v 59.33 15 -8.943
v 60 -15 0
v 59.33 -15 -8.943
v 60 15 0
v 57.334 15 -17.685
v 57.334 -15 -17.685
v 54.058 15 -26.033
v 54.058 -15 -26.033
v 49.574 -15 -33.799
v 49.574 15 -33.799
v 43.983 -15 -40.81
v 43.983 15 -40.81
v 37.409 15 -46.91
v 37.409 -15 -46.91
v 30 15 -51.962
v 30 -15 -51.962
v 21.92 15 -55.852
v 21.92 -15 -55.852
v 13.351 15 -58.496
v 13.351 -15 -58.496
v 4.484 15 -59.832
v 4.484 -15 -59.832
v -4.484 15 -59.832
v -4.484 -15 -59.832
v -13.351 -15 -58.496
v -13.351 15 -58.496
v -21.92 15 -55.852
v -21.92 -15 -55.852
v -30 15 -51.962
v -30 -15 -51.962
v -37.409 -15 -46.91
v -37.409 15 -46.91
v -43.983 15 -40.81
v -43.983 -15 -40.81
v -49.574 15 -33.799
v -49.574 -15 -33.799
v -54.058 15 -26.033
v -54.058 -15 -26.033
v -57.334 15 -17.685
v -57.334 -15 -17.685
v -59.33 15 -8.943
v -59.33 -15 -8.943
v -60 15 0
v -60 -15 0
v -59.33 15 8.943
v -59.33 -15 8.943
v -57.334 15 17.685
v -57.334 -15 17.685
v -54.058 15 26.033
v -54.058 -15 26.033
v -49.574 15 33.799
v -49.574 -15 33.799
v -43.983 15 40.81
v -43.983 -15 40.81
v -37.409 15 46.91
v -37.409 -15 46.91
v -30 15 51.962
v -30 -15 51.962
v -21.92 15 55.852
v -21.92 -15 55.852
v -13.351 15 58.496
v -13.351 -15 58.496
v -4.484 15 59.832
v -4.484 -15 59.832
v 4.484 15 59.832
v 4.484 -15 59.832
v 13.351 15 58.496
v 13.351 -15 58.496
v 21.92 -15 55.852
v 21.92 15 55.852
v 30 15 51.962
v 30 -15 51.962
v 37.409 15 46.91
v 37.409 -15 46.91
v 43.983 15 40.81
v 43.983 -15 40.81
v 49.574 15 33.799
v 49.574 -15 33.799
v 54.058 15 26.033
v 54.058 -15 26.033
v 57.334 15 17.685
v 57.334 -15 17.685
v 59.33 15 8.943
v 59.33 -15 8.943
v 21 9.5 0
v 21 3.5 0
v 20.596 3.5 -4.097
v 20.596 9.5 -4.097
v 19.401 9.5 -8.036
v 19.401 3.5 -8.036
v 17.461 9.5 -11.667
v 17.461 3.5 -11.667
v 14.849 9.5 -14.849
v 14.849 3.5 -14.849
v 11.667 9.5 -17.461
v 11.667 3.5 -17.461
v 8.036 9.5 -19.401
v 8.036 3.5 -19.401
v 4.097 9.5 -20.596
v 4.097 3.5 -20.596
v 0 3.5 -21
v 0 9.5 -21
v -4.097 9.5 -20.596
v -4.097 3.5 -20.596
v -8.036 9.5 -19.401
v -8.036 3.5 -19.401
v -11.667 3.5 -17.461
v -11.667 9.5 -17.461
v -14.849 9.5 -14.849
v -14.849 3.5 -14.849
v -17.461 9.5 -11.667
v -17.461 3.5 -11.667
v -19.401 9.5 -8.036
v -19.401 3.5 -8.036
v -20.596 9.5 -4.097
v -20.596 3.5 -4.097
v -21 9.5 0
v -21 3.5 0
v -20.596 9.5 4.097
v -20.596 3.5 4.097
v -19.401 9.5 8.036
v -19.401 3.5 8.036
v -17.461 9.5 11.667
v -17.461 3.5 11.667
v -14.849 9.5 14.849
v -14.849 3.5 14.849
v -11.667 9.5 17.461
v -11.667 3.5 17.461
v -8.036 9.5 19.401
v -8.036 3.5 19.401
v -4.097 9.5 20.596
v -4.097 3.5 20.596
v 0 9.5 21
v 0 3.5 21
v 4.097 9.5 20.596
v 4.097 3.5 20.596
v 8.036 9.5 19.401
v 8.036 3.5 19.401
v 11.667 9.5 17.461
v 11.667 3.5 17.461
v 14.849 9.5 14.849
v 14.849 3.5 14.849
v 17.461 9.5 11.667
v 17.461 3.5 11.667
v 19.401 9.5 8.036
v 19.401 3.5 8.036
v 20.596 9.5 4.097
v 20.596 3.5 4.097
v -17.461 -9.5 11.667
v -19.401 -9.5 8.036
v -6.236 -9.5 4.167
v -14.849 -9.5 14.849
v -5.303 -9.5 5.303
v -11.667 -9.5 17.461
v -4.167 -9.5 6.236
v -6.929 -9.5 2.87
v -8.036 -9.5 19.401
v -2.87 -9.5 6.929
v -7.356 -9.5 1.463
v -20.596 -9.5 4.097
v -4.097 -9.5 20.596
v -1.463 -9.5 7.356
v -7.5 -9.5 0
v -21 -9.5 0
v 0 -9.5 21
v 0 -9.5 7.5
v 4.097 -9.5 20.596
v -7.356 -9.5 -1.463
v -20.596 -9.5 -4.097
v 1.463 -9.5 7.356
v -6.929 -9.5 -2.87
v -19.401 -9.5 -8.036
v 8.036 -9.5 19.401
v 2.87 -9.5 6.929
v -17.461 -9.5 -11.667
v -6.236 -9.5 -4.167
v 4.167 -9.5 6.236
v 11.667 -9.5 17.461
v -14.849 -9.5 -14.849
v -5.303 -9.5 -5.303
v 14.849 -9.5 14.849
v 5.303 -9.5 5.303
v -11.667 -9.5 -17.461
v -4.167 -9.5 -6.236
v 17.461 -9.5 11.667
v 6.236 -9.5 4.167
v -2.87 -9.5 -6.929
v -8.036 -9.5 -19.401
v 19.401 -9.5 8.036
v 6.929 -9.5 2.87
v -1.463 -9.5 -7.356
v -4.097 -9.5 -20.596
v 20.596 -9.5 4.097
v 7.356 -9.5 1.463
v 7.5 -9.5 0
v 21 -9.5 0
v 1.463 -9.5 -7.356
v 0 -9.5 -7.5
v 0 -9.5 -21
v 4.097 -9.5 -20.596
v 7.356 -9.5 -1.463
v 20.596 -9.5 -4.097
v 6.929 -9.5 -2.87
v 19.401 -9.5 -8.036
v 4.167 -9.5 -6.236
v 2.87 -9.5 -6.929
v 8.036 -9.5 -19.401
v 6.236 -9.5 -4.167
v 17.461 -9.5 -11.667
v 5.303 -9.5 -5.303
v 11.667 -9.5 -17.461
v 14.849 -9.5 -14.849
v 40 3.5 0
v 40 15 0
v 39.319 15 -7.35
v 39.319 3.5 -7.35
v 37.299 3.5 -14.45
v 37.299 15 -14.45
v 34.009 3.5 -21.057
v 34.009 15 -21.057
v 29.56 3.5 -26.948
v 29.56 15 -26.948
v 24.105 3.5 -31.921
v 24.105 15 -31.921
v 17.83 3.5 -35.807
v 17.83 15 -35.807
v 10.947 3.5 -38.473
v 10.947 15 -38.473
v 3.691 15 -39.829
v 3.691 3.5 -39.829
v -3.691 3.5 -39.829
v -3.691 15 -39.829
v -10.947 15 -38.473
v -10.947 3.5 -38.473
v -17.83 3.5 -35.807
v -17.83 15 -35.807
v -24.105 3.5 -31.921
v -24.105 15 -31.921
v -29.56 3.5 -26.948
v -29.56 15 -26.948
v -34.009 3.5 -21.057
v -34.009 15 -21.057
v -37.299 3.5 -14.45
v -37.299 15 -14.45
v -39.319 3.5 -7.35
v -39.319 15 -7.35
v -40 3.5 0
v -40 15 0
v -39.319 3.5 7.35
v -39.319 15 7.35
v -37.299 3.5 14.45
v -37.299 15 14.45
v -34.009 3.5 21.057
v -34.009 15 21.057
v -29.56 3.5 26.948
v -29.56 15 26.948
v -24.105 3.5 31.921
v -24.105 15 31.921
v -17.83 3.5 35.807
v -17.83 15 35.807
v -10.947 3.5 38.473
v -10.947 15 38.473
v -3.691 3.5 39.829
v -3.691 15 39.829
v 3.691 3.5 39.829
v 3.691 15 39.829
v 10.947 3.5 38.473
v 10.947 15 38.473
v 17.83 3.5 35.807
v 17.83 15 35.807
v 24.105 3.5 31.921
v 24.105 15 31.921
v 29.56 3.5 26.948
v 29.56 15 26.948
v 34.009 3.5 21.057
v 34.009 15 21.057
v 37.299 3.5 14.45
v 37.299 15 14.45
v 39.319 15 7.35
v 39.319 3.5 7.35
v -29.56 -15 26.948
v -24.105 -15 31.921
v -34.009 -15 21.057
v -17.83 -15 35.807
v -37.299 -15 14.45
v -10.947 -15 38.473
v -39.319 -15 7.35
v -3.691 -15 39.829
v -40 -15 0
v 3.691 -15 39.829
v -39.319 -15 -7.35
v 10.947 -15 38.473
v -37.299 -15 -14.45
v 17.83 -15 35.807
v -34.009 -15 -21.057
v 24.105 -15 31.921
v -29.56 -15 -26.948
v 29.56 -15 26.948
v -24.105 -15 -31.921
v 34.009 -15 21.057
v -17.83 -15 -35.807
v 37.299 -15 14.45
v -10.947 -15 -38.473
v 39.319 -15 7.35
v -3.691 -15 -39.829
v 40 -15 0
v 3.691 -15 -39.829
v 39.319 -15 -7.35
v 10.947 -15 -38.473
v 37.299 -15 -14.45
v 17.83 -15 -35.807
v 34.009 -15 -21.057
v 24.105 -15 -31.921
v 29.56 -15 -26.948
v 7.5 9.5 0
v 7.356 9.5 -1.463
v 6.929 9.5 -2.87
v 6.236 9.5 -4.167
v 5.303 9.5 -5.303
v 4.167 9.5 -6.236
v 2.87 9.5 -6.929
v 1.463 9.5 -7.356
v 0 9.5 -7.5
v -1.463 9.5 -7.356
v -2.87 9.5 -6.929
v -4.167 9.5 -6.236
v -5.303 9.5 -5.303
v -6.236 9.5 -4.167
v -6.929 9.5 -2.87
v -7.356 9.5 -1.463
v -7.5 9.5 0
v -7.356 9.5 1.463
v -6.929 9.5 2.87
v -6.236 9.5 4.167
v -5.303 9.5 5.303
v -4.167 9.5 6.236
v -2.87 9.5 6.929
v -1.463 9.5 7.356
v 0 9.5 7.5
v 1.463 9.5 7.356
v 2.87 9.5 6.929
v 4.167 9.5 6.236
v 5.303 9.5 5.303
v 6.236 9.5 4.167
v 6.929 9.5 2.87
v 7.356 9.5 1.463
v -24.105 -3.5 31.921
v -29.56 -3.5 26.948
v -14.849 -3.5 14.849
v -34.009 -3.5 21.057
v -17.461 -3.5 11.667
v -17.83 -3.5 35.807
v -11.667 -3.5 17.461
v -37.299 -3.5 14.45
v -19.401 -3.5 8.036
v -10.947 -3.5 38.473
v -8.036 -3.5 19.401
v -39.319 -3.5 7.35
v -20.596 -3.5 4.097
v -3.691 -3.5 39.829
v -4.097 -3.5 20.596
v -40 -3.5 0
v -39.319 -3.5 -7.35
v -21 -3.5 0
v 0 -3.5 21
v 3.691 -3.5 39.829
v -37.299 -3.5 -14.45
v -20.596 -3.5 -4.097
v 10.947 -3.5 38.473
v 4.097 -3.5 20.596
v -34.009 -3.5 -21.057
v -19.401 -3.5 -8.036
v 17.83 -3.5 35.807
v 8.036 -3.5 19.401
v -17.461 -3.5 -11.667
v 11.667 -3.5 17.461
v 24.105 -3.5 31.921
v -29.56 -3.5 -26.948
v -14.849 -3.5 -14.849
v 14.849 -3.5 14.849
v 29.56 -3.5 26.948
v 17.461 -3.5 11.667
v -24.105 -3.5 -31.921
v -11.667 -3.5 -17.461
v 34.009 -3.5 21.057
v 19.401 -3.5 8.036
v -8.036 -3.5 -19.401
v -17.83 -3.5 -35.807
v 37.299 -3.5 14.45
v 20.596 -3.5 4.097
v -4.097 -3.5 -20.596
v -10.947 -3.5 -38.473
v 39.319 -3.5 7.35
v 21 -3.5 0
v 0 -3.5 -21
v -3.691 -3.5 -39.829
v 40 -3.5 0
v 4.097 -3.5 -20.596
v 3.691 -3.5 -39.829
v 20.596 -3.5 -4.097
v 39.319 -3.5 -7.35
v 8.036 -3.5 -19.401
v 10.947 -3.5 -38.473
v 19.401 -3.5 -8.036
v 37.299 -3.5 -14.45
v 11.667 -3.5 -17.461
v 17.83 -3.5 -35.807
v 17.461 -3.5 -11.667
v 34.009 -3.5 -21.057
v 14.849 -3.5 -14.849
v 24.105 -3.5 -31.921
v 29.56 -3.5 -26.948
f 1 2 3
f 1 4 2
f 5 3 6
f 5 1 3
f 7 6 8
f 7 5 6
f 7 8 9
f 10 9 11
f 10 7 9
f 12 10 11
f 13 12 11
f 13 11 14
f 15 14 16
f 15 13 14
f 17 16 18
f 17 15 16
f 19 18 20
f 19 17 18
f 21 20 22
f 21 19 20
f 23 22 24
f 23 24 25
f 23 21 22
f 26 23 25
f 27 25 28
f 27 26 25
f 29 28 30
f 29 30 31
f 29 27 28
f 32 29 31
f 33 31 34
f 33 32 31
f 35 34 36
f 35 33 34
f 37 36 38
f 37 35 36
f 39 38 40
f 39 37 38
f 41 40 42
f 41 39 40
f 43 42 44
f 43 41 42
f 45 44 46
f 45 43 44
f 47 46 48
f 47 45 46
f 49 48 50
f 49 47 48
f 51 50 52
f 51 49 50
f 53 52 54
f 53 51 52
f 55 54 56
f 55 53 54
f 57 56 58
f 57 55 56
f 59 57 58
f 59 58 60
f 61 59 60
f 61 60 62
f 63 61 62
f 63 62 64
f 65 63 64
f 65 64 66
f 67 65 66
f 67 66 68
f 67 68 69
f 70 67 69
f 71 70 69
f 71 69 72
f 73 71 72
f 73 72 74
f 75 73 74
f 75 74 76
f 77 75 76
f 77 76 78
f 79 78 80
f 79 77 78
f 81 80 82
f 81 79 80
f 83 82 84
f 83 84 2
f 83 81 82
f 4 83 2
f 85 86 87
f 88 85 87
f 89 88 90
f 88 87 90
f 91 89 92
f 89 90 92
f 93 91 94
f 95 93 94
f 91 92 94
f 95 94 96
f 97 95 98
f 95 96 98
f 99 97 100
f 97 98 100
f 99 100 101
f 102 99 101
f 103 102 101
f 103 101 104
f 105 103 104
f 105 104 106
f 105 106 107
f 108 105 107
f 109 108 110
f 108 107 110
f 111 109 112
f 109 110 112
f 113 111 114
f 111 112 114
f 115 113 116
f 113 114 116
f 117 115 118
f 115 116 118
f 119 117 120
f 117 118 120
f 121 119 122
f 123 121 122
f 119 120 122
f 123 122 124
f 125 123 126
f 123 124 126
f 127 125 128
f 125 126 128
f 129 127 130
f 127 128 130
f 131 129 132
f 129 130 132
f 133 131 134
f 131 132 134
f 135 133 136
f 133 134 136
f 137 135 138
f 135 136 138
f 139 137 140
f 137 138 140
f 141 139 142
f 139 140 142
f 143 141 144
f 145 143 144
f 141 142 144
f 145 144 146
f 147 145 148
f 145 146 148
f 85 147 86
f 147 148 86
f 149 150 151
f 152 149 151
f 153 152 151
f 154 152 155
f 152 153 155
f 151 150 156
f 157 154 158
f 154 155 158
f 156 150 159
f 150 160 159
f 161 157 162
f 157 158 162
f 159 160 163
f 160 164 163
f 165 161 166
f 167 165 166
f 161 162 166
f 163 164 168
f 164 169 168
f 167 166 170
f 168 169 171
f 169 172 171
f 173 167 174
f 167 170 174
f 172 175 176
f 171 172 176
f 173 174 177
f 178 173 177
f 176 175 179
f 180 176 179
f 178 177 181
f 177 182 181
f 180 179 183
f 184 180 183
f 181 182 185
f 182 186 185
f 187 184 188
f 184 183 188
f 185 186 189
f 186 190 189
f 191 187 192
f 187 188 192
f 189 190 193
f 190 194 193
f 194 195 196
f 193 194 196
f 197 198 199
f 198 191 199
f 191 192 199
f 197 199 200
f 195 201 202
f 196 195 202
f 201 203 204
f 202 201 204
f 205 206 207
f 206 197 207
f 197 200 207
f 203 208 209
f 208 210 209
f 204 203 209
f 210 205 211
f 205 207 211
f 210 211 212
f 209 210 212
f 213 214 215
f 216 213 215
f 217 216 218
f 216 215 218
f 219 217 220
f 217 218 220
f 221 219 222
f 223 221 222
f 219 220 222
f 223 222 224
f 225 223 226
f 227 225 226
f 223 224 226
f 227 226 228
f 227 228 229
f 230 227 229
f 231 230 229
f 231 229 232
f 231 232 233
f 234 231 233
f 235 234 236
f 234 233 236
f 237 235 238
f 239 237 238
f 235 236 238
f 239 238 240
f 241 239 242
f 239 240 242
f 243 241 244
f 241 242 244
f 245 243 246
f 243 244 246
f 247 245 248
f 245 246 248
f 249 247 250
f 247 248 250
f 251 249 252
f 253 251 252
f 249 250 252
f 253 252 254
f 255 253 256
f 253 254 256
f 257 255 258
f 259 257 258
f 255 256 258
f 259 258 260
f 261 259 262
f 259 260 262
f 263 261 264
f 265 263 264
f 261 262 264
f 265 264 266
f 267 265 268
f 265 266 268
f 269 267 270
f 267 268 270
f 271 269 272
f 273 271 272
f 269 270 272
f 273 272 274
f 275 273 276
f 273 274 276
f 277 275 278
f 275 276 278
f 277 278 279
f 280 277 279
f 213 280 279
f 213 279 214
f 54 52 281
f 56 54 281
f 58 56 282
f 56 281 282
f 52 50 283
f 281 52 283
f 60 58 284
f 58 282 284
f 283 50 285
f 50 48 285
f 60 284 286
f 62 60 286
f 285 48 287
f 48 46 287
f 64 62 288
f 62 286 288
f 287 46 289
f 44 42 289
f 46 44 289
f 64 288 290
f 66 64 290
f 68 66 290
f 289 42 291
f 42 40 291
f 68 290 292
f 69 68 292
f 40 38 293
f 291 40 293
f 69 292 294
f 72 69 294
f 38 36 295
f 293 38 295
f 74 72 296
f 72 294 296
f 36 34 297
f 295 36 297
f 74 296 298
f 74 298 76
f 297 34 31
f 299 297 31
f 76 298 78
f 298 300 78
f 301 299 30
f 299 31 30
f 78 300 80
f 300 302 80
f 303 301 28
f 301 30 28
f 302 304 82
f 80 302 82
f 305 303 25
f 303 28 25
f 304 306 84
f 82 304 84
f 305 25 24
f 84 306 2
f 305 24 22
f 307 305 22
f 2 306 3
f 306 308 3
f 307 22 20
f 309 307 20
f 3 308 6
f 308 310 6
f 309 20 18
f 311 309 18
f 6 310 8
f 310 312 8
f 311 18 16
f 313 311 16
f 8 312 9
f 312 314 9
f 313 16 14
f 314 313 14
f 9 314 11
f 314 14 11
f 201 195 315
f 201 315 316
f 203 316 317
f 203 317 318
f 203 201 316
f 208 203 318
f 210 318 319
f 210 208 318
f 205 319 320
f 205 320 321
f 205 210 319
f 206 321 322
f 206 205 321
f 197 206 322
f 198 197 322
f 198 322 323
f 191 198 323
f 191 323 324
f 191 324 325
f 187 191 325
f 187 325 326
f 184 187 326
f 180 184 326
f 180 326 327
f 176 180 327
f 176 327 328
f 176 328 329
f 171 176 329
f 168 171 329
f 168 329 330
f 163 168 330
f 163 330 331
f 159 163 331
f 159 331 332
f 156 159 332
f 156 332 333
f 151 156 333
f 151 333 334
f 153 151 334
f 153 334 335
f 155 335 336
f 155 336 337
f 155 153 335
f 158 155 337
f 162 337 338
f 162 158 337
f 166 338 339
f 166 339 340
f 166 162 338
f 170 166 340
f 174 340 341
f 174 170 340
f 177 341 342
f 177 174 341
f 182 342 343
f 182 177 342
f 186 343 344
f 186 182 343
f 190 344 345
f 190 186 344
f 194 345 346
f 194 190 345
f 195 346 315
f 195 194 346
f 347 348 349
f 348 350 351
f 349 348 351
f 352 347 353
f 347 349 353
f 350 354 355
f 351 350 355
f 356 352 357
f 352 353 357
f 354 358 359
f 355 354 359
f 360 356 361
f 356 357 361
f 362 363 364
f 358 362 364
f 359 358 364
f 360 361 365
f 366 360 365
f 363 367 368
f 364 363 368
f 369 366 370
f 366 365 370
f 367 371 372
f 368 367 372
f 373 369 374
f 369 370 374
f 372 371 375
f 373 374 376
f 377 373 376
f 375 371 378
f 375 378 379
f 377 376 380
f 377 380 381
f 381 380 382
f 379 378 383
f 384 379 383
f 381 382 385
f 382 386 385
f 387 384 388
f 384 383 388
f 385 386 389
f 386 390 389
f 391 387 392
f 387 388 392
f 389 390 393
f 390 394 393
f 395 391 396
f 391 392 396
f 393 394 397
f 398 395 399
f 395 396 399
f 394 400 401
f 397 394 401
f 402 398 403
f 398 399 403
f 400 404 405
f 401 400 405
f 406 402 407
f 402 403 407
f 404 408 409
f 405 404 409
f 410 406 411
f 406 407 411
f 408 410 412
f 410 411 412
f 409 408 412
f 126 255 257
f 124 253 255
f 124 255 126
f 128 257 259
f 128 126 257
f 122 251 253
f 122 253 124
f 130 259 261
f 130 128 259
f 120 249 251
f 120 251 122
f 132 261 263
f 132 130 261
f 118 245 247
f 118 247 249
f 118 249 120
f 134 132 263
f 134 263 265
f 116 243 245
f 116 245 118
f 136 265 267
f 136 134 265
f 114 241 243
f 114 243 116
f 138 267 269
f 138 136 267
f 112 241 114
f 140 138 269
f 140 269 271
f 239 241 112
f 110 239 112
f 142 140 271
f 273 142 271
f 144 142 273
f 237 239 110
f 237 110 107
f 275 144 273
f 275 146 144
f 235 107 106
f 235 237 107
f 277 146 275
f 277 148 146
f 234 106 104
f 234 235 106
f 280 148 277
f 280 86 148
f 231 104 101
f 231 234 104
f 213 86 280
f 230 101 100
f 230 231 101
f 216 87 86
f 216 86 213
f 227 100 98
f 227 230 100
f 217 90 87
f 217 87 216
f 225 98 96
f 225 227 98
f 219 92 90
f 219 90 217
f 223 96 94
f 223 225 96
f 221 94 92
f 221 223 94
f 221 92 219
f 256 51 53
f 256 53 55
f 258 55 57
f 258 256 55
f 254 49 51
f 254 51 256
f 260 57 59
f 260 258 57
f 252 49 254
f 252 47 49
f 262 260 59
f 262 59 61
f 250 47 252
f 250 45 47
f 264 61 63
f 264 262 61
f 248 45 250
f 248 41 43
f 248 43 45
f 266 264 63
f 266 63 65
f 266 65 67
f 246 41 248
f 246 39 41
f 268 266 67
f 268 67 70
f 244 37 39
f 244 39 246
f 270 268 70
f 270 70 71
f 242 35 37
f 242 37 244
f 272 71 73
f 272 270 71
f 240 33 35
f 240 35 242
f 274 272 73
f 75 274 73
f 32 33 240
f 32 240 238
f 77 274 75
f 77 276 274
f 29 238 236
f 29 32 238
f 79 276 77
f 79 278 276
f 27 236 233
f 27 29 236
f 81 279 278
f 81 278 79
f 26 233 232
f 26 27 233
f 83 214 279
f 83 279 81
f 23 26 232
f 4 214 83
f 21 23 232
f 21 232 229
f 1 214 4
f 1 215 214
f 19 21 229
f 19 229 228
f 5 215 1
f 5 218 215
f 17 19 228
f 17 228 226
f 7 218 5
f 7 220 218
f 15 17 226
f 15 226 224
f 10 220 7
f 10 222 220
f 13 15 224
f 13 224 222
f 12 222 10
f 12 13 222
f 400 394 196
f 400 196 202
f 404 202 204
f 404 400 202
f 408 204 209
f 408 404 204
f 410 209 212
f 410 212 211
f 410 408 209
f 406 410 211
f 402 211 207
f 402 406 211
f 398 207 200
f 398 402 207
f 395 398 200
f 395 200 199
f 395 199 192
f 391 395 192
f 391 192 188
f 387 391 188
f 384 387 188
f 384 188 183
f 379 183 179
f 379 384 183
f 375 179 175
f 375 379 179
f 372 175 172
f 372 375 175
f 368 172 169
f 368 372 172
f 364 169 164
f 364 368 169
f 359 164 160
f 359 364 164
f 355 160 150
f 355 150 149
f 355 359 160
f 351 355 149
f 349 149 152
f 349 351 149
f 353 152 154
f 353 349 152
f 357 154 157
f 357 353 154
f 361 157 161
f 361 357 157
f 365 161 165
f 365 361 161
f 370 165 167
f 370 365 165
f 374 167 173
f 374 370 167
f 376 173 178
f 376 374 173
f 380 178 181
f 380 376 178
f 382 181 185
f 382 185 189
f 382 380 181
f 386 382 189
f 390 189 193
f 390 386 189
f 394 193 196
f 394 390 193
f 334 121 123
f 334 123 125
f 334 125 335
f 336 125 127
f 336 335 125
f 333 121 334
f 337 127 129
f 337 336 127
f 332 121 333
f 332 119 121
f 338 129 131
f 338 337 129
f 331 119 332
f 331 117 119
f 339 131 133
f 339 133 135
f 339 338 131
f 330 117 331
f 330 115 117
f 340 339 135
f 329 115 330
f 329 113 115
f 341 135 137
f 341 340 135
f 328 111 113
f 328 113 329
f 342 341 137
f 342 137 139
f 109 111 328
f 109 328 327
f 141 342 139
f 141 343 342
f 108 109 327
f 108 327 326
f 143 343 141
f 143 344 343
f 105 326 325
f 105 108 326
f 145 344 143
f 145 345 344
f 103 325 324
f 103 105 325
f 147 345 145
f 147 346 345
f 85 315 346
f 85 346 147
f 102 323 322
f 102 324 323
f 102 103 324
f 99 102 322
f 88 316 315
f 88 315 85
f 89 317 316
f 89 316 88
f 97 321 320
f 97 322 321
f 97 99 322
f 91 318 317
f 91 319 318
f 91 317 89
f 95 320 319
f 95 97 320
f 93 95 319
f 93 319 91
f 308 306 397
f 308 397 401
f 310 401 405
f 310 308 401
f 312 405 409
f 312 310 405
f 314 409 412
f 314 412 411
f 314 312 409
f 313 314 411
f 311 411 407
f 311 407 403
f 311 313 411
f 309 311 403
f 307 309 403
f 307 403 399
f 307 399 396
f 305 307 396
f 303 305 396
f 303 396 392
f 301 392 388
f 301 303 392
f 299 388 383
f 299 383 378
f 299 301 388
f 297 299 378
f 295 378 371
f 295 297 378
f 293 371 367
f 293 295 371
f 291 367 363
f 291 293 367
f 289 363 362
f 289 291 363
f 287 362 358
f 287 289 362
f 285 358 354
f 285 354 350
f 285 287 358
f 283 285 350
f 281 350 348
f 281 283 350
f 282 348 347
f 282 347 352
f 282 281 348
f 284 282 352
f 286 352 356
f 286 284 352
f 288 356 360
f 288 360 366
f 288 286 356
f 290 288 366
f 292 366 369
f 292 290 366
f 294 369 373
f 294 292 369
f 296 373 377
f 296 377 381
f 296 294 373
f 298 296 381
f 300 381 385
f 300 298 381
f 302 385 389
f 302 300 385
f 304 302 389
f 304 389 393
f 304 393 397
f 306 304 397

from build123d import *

# Parameters (mm, degrees)
BOSS_EXTRUDE1_DEPTH      = 15
BOSS_EXTRUDE1_DEPTH_BACK = 15
SKETCH2_R                = 60
SKETCH3_R                = 40
CUT_EXTRUDE1_DEPTH       = 11.5
SKETCH4_R                = 21
BOSS_EXTRUDE2_DEPTH      = 6
SKETCH5_R                = 7.5
CUT_EXTRUDE2_DEPTH       = 20


with BuildPart() as part:
    # Sketch2 → Boss-Extrude1 (new, two sides: drawn at the far end of the back side and taken through both)
    with BuildSketch(Plane(origin=(0, 0, 0), x_dir=(1, 0, 0), z_dir=(0, 1, 0)).offset(-BOSS_EXTRUDE1_DEPTH_BACK)):
        Circle(SKETCH2_R)
    extrude(amount=BOSS_EXTRUDE1_DEPTH + BOSS_EXTRUDE1_DEPTH_BACK)

    # Sketch3 → Cut-Extrude1 (cut)
    with BuildSketch(Plane(origin=(0, 15, 0), x_dir=(1, 0, 0), z_dir=(0, 1, 0))):
        Circle(SKETCH3_R)
    cut_extrude1 = extrude(amount=-CUT_EXTRUDE1_DEPTH, mode=Mode.SUBTRACT)

    # Sketch4 → Boss-Extrude2 (add)
    with BuildSketch(Plane(origin=(0, 3.5, 0), x_dir=(1, 0, 0), z_dir=(0, 1, 0))):
        Circle(SKETCH4_R)
    boss_extrude2 = extrude(amount=BOSS_EXTRUDE2_DEPTH)

    # Sketch5 → Cut-Extrude2 (cut)
    with BuildSketch(Plane(origin=(0, 9.5, 0), x_dir=(1, 0, 0), z_dir=(0, 1, 0))):
        Circle(SKETCH5_R)
    cut_extrude2 = extrude(amount=-CUT_EXTRUDE2_DEPTH, mode=Mode.SUBTRACT)

    # Mirror1: Cut-Extrude1, Boss-Extrude2, Cut-Extrude2 across plane
    add(cut_extrude1.mirror(Plane.ZX), mode=Mode.SUBTRACT)
    add(boss_extrude2.mirror(Plane.ZX))
    add(cut_extrude2.mirror(Plane.ZX), mode=Mode.SUBTRACT)


solid = part.part
